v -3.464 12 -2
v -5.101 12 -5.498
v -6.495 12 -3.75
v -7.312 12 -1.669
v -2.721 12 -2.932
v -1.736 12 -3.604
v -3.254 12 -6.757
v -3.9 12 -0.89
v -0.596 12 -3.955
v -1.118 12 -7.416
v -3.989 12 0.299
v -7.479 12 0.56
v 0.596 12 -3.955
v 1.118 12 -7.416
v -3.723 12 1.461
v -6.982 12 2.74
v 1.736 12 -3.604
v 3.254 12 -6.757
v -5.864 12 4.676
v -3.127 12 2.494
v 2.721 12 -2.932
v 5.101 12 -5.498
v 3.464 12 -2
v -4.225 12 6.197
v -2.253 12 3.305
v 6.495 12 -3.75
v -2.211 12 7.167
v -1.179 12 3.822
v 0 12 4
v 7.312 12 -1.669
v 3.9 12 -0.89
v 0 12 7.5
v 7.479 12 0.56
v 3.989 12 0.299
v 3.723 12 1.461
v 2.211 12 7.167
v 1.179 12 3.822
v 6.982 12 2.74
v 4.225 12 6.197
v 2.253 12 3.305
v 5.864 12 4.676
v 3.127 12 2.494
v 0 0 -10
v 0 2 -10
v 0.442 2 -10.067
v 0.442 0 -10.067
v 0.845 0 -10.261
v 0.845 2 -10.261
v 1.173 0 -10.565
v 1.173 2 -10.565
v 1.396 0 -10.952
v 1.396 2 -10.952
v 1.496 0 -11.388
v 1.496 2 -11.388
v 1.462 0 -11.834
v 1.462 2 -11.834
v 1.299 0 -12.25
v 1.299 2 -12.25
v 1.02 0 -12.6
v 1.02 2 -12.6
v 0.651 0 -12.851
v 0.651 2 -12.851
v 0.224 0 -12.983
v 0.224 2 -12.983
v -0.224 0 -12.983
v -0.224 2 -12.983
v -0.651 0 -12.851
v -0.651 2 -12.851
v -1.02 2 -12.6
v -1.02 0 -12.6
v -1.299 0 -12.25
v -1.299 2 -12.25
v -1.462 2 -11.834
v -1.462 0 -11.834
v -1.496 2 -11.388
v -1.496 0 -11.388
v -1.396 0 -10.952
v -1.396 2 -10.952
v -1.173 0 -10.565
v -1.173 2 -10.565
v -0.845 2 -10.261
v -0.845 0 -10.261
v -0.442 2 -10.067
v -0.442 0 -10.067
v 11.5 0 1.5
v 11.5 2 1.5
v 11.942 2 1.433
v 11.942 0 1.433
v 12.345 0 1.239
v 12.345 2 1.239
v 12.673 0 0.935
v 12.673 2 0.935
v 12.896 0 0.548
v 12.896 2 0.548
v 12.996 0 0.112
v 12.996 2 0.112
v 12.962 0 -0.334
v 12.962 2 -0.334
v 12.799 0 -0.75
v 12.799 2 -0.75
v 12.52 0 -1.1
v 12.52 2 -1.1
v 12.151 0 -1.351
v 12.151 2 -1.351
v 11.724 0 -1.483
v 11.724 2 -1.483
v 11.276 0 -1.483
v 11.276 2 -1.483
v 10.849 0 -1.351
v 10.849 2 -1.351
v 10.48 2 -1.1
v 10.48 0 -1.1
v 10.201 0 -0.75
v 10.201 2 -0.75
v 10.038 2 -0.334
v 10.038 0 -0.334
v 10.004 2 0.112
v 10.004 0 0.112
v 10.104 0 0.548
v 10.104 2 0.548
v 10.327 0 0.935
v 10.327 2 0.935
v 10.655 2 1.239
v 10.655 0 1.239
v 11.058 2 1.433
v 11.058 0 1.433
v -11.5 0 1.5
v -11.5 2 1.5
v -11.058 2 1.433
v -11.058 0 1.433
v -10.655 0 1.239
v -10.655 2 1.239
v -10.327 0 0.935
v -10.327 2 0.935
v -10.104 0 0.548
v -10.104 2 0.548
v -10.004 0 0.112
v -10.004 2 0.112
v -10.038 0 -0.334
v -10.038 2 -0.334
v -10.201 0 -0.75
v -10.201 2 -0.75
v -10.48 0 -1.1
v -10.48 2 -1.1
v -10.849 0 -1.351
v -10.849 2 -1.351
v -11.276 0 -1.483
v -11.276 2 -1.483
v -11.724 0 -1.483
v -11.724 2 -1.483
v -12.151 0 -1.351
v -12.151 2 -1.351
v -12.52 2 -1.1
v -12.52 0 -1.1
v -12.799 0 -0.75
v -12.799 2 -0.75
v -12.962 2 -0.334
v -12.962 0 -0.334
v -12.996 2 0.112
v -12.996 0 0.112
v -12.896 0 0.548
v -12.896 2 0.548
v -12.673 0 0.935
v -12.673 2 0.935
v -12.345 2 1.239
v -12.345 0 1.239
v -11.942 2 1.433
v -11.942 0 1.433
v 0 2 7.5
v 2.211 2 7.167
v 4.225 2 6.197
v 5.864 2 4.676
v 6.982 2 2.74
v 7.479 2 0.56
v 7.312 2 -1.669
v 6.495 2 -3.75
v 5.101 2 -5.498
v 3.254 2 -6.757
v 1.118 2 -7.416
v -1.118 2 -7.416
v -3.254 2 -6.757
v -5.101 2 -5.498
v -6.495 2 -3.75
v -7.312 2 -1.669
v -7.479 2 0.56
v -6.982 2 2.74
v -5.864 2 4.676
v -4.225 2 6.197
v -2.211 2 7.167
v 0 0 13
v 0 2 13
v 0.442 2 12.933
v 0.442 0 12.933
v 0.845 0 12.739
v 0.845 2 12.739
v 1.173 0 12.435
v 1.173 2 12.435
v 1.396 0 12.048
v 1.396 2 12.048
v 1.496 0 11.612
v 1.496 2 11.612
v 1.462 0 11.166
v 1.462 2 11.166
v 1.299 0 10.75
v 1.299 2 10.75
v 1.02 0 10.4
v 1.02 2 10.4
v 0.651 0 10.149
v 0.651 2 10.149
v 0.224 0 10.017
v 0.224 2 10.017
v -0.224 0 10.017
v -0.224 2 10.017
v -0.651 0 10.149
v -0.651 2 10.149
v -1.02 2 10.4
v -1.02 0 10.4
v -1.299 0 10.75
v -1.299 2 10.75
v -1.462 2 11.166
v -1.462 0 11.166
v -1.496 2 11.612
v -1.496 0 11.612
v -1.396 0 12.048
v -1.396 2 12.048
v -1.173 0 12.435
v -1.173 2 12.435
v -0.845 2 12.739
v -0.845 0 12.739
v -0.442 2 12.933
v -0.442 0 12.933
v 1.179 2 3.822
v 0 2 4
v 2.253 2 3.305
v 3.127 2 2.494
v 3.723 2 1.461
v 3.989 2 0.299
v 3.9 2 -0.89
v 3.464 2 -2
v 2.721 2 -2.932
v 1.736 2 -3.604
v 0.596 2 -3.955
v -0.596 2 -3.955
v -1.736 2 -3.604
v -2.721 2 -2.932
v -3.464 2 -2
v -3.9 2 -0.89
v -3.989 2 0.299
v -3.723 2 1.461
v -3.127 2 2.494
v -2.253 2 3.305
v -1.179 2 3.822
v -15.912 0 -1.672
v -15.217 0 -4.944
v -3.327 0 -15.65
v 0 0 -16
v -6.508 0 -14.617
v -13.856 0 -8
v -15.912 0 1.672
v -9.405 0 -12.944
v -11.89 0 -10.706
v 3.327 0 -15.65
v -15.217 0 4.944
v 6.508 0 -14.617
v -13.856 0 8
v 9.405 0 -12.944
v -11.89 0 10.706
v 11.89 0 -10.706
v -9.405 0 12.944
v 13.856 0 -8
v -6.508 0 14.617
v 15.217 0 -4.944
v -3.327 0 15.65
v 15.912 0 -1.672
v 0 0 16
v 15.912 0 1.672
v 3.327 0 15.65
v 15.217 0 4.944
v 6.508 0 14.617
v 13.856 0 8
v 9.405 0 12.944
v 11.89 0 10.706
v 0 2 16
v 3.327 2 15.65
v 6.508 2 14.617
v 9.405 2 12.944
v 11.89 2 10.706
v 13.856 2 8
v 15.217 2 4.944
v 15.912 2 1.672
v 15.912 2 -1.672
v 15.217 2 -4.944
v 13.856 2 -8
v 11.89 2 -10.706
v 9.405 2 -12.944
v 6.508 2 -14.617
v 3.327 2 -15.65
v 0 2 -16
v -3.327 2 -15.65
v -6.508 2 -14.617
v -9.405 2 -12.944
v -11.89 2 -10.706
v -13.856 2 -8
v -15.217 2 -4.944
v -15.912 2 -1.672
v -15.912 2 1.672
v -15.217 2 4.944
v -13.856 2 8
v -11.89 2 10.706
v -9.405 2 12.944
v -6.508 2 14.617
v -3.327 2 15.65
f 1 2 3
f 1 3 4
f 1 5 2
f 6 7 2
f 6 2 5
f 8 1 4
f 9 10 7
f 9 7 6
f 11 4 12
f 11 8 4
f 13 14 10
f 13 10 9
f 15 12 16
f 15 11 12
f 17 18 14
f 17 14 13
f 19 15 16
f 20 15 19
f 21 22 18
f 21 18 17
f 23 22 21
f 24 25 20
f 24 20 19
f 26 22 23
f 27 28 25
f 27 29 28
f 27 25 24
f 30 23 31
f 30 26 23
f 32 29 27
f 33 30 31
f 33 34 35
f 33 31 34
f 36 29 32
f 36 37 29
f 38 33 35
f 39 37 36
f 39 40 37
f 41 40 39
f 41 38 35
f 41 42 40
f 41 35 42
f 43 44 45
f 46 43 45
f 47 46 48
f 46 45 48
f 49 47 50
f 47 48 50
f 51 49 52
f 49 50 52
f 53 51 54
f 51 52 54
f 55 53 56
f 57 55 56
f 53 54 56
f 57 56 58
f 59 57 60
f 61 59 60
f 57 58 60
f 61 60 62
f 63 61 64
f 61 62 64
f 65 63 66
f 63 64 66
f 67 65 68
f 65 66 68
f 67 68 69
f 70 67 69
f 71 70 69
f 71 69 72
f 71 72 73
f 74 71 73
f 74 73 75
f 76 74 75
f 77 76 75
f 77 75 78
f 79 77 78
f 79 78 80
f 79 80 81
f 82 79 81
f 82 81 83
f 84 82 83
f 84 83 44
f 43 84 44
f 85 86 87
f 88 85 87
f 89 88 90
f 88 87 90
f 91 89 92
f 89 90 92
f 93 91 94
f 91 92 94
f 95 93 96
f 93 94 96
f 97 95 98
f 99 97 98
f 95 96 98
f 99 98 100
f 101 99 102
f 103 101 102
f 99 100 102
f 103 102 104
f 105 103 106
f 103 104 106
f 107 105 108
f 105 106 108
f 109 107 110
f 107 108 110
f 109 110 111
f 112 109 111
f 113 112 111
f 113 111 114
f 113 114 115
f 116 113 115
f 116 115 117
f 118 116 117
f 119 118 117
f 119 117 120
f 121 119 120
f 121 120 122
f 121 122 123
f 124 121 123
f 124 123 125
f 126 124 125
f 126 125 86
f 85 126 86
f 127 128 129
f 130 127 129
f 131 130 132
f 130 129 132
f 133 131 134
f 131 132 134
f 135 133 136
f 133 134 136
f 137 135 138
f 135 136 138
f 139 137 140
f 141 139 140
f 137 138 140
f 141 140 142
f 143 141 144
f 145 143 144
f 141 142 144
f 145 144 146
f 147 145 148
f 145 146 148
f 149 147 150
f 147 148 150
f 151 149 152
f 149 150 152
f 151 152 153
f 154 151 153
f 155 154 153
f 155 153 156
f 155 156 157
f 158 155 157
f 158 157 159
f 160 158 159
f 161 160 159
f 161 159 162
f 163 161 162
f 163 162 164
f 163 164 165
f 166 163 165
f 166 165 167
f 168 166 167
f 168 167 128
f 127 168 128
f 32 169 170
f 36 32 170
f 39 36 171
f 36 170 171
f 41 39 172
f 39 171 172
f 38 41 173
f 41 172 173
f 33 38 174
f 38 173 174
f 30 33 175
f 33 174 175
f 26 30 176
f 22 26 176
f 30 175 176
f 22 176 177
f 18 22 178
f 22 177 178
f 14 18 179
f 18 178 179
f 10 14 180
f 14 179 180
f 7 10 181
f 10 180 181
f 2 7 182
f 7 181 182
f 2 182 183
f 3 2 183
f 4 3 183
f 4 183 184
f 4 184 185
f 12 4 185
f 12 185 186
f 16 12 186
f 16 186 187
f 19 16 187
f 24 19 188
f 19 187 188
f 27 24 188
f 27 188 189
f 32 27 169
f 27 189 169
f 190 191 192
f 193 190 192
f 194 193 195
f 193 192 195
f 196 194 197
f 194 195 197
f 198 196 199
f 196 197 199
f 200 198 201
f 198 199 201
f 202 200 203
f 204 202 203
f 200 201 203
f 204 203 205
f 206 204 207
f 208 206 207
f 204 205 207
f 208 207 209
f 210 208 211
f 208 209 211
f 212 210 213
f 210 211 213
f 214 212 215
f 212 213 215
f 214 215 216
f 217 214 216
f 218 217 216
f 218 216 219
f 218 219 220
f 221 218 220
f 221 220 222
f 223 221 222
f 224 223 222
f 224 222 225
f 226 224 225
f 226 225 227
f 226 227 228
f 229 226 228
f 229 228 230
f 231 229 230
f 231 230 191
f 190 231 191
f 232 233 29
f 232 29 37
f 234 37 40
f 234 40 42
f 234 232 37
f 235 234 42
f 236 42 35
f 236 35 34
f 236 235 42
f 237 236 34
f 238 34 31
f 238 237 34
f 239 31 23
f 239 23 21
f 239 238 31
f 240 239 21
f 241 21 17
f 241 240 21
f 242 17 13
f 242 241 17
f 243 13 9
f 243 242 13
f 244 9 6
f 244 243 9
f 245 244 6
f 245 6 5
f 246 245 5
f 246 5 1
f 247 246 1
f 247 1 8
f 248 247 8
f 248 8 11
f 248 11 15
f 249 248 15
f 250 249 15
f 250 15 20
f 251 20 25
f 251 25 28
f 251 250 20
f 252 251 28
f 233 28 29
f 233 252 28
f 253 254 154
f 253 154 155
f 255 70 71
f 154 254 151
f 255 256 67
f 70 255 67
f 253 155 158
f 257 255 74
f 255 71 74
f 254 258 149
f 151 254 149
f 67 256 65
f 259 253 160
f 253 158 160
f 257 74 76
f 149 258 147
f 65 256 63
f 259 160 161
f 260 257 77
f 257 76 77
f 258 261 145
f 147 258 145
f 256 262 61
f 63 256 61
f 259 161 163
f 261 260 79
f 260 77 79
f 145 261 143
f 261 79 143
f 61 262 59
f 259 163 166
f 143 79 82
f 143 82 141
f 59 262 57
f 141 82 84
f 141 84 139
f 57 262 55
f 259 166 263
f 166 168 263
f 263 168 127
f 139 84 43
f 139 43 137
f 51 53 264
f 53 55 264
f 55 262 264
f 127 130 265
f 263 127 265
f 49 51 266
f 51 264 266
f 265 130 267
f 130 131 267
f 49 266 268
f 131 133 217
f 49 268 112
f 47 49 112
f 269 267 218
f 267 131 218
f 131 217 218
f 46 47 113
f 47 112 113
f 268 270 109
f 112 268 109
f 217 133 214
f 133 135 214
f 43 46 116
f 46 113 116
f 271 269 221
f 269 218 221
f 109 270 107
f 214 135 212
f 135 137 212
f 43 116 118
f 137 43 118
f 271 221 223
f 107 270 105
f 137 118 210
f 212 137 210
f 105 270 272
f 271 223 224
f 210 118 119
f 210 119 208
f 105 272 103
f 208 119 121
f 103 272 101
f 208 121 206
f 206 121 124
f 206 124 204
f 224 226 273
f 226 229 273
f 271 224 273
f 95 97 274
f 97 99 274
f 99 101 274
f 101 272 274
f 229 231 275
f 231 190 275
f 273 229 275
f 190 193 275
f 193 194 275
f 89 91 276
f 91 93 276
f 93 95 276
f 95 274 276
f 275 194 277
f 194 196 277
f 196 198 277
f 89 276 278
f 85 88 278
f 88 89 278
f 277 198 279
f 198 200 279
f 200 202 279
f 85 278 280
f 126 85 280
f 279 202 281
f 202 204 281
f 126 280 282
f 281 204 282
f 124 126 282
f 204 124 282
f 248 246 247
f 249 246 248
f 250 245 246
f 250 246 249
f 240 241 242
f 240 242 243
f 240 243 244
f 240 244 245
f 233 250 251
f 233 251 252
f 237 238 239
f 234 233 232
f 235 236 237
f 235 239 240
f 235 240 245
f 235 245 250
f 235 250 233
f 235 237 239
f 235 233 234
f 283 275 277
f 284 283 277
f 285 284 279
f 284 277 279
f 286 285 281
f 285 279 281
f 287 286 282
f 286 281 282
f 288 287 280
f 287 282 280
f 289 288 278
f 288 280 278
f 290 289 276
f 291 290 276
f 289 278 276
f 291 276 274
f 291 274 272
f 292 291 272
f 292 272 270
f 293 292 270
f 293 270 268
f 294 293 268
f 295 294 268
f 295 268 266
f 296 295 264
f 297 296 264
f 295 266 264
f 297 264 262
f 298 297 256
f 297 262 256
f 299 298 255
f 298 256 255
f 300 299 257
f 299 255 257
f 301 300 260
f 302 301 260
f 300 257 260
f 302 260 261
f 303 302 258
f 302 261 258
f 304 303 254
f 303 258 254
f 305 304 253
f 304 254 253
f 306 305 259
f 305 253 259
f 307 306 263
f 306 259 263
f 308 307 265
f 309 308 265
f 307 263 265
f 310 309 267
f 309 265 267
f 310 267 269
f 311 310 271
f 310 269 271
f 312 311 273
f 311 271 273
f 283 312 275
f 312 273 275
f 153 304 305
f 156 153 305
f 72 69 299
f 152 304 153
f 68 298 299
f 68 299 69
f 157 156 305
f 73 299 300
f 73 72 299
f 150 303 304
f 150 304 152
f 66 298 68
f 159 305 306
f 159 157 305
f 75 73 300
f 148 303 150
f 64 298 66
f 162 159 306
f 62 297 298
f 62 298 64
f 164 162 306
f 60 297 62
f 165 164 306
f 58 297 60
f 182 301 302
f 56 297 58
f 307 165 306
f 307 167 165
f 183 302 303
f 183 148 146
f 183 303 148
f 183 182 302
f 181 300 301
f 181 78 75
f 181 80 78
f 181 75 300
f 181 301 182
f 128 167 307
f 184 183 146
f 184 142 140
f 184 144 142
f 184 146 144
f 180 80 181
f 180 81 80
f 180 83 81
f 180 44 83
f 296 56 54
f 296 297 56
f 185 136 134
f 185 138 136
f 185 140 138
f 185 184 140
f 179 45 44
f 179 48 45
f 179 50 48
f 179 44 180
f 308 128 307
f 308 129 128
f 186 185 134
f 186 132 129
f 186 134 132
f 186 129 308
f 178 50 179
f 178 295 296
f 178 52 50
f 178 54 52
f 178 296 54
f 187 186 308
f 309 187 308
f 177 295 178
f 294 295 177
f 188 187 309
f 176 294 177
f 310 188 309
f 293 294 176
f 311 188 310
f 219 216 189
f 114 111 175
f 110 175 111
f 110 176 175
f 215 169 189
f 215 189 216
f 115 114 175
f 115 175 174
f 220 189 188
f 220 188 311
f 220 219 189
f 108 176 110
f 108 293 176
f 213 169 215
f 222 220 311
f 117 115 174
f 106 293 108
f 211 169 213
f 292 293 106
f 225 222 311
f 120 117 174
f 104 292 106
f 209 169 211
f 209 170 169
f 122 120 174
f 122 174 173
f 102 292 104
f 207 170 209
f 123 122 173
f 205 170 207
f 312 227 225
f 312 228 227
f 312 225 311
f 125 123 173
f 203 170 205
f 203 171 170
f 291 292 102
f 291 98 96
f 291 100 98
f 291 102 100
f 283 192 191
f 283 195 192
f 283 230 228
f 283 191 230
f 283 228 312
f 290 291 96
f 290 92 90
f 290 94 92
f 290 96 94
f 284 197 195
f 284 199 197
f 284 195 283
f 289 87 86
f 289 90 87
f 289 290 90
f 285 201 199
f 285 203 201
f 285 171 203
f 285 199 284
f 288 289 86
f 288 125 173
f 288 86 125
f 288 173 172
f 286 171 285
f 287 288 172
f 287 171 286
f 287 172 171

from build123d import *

# Parameters (mm, degrees)
SKETCH_1_R          = 16
EXTRUDE_1_DEPTH     = 2
SKETCH_2_R          = 7.5
SKETCH_2_R_2        = 4
EXTRUDE_2_DEPTH     = 10
SKETCH_3_R          = 1.5
CUT_EXTRUDE_1_DEPTH = 10


with BuildPart() as part:
    # 草图1 → 凸台-拉伸1 (new body)
    with BuildSketch(Plane(origin=(0, 0, 0), x_dir=(1, 0, 0), z_dir=(0, 1, 0))):
        with Locations(Location((0, 0, 0), (0, 0, 270))):
            Circle(SKETCH_1_R)
    extrude(amount=EXTRUDE_1_DEPTH)

    # 草图2 → 凸台-拉伸2 (add)
    with BuildSketch(Plane(origin=(0, 2, 0), x_dir=(1, 0, 0), z_dir=(0, 1, 0))):
        with Locations(Location((0, 0, 0), (0, 0, 270))):
            Circle(SKETCH_2_R)
        with Locations(Location((0, 0, 0), (0, 0, 270))):
            Circle(SKETCH_2_R_2, mode=Mode.SUBTRACT)
    extrude(amount=EXTRUDE_2_DEPTH)

    # 草图3 → 切除-拉伸1 (cut)
    with BuildSketch(Plane(origin=(0, 2, 0), x_dir=(1, 0, 0), z_dir=(0, 1, 0))):
        with Locations(Location((-11.5, 0, 0), (0, 0, 270))):
            Circle(SKETCH_3_R)
        with Locations(Location((0, 11.5, 0), (0, 0, 270))):
            Circle(SKETCH_3_R)
        with Locations(Location((11.5, 0, 0), (0, 0, 270))):
            Circle(SKETCH_3_R)
        with Locations(Location((0, -11.5, 0), (0, 0, 270))):
            Circle(SKETCH_3_R)
    extrude(amount=-CUT_EXTRUDE_1_DEPTH, mode=Mode.SUBTRACT)


solid = part.part
